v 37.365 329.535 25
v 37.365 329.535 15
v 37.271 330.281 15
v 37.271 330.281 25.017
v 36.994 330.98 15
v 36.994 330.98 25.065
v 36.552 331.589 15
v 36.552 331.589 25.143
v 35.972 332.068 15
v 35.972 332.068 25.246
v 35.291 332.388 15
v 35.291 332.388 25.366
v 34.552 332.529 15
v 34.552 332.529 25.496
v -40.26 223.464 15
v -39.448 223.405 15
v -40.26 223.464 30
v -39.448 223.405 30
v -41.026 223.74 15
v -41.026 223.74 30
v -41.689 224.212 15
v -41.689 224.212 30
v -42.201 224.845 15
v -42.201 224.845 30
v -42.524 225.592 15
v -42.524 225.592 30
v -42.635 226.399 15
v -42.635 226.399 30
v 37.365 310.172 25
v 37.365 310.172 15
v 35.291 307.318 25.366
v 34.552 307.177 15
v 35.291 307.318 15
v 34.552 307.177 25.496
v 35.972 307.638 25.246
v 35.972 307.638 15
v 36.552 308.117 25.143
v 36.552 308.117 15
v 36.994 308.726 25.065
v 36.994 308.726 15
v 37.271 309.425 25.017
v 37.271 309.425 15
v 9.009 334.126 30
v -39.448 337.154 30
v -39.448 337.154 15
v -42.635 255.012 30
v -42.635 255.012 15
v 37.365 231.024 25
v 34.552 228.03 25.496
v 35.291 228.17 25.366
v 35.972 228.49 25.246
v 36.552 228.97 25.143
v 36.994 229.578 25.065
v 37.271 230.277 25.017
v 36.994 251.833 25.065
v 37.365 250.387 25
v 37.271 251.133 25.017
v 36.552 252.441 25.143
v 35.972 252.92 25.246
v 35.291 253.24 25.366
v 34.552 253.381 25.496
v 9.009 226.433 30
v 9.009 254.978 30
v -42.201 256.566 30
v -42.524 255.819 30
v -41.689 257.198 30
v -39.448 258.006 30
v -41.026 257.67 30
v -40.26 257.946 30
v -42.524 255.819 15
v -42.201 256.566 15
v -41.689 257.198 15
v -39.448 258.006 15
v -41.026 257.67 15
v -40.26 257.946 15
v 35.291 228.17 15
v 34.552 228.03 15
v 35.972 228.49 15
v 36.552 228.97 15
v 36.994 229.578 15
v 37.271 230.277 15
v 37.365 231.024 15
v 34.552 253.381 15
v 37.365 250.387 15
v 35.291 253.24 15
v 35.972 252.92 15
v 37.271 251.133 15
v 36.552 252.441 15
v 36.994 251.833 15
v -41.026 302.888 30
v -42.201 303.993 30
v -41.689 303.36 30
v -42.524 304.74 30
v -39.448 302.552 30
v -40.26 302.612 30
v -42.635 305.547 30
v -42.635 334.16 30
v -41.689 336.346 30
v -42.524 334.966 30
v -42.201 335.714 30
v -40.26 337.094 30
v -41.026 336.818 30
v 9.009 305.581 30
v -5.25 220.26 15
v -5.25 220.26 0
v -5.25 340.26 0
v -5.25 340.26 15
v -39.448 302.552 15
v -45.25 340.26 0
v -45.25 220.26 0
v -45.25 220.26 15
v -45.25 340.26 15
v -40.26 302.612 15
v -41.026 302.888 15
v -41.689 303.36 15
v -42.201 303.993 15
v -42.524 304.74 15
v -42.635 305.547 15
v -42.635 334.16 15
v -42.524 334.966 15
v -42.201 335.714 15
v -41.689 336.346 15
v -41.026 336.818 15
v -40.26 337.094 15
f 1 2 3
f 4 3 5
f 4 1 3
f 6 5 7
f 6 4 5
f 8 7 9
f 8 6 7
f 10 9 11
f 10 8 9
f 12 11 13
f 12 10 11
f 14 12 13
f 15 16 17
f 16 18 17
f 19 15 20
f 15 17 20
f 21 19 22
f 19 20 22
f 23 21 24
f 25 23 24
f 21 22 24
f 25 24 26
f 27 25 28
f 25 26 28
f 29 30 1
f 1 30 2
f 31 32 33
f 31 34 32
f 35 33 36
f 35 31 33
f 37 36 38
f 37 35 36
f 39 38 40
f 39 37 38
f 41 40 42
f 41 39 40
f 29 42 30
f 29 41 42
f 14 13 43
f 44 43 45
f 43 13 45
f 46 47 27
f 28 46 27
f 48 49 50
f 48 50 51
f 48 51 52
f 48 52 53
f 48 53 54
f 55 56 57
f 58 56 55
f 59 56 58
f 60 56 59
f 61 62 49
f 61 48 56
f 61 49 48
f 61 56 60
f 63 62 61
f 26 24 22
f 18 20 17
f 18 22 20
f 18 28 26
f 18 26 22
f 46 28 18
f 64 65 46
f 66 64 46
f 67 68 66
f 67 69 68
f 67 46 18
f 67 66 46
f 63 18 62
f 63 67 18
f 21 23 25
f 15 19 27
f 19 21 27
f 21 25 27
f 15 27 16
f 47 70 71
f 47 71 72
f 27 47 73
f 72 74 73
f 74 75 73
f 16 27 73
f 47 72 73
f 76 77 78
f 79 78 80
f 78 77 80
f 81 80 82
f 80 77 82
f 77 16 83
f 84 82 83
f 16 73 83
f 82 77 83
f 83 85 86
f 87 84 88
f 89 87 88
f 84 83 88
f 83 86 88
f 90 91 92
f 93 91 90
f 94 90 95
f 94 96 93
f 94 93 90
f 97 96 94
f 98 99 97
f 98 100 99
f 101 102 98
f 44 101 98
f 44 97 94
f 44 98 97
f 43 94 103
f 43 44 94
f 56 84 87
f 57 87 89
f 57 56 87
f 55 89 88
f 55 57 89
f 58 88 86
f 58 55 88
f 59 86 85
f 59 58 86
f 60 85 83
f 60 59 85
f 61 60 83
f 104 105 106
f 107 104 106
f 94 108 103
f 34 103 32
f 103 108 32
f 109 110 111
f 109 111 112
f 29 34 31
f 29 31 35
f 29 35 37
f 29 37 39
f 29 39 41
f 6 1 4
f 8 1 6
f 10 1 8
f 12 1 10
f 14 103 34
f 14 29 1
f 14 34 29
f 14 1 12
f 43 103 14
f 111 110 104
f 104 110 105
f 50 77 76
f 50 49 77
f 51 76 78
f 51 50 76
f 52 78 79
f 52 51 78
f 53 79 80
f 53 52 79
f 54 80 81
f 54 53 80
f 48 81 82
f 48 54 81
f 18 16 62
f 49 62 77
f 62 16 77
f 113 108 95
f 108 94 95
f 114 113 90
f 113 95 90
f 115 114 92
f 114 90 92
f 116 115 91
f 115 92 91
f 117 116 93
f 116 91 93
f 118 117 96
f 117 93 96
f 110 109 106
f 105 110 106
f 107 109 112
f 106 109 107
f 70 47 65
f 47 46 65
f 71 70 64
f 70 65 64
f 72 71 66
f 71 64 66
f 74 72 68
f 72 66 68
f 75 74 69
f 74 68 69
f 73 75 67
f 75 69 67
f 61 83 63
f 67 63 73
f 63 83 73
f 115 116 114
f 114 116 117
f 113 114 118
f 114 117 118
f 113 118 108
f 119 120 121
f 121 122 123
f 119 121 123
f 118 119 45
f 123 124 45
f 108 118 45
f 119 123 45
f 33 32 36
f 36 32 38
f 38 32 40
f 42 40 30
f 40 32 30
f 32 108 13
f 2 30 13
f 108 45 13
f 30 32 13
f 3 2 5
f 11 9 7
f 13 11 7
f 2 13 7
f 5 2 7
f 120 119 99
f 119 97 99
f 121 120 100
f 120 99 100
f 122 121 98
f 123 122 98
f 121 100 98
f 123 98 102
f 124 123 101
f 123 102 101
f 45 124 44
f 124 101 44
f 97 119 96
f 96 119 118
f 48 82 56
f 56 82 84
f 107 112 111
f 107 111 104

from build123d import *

# Parameters (mm, degrees)
SKETCH1_W             = 40
SKETCH1_H             = 120
BOSS_EXTRUDE1_DEPTH   = 15
BOSS_EXTRUDE2_DEPTH   = 15
BOSS_EXTRUDE2_2_DEPTH = 15
CHAMFER1_SIZE         = 5
CHAMFER1_SIZE2        = 28.356409098
CHAMFER2_SIZE         = 5
CHAMFER2_SIZE2        = 28.356409098
FILLET1_R             = 3
FILLET2_R             = 3


with BuildPart() as part:
    # Sketch1 → Boss-Extrude1 (new body)
    with BuildSketch(Plane.XY):
        with Locations((-25.25044303, 280.25981555)):
            Rectangle(SKETCH1_W, SKETCH1_H)
    extrude(amount=BOSS_EXTRUDE1_DEPTH)


with BuildPart() as body_2:
    # Sketch2 → Boss-Extrude2 (new body)
    with BuildSketch(Plane.XY.offset(15)):
        Polygon((-42.634929193, 258.205318026), (-42.634929193, 223.205318026), (37.365070807, 228.205318026), (37.365070807, 253.205318026), align=None)
    extrude(amount=BOSS_EXTRUDE2_DEPTH)

    # Chamfer2
    chamfer2_edges = [body_2.edges().sort_by_distance(p)[0] for p in [
        (37.365070807, 240.705318026, 30),
    ]]
    chamfer2_side = [body_2.faces().sort_by_distance(p)[0] for p in [
        (37.365070807, 240.705318026, 22.5),
    ]]
    chamfer(chamfer2_edges, length=CHAMFER2_SIZE, length2=CHAMFER2_SIZE2, reference=chamfer2_side[0])

    # Fillet1
    fillet1_edges = [body_2.edges().sort_by_distance(p)[0] for p in [
        (37.365070807, 253.205318026, 20),
        (37.365070807, 228.205318026, 20),
        (-42.634929193, 223.205318026, 22.5),
        (-42.634929193, 258.205318026, 22.5),
    ]]
    fillet(fillet1_edges, radius=FILLET1_R)


with BuildPart() as body_3:
    # Sketch2 → Boss-Extrude2 2 (new body)
    with BuildSketch(Plane.XY.offset(15)):
        Polygon((-42.634929193, 337.353227074), (-42.634929193, 302.353227074), (37.365070807, 307.353227074), (37.365070807, 332.353227074), align=None)
    extrude(amount=BOSS_EXTRUDE2_2_DEPTH)

    # Chamfer1
    chamfer1_edges = [body_3.edges().sort_by_distance(p)[0] for p in [
        (37.365070807, 319.853227074, 30),
    ]]
    chamfer1_side = [body_3.faces().sort_by_distance(p)[0] for p in [
        (37.365070807, 319.853227074, 22.5),
    ]]
    chamfer(chamfer1_edges, length=CHAMFER1_SIZE, length2=CHAMFER1_SIZE2, reference=chamfer1_side[0])

    # Fillet2
    fillet2_edges = [body_3.edges().sort_by_distance(p)[0] for p in [
        (37.365070807, 332.353227074, 20),
        (37.365070807, 307.353227074, 20),
        (-42.634929193, 302.353227074, 22.5),
        (-42.634929193, 337.353227074, 22.5),
    ]]
    fillet(fillet2_edges, radius=FILLET2_R)


solid = Compound([part.part, body_2.part, body_3.part])
